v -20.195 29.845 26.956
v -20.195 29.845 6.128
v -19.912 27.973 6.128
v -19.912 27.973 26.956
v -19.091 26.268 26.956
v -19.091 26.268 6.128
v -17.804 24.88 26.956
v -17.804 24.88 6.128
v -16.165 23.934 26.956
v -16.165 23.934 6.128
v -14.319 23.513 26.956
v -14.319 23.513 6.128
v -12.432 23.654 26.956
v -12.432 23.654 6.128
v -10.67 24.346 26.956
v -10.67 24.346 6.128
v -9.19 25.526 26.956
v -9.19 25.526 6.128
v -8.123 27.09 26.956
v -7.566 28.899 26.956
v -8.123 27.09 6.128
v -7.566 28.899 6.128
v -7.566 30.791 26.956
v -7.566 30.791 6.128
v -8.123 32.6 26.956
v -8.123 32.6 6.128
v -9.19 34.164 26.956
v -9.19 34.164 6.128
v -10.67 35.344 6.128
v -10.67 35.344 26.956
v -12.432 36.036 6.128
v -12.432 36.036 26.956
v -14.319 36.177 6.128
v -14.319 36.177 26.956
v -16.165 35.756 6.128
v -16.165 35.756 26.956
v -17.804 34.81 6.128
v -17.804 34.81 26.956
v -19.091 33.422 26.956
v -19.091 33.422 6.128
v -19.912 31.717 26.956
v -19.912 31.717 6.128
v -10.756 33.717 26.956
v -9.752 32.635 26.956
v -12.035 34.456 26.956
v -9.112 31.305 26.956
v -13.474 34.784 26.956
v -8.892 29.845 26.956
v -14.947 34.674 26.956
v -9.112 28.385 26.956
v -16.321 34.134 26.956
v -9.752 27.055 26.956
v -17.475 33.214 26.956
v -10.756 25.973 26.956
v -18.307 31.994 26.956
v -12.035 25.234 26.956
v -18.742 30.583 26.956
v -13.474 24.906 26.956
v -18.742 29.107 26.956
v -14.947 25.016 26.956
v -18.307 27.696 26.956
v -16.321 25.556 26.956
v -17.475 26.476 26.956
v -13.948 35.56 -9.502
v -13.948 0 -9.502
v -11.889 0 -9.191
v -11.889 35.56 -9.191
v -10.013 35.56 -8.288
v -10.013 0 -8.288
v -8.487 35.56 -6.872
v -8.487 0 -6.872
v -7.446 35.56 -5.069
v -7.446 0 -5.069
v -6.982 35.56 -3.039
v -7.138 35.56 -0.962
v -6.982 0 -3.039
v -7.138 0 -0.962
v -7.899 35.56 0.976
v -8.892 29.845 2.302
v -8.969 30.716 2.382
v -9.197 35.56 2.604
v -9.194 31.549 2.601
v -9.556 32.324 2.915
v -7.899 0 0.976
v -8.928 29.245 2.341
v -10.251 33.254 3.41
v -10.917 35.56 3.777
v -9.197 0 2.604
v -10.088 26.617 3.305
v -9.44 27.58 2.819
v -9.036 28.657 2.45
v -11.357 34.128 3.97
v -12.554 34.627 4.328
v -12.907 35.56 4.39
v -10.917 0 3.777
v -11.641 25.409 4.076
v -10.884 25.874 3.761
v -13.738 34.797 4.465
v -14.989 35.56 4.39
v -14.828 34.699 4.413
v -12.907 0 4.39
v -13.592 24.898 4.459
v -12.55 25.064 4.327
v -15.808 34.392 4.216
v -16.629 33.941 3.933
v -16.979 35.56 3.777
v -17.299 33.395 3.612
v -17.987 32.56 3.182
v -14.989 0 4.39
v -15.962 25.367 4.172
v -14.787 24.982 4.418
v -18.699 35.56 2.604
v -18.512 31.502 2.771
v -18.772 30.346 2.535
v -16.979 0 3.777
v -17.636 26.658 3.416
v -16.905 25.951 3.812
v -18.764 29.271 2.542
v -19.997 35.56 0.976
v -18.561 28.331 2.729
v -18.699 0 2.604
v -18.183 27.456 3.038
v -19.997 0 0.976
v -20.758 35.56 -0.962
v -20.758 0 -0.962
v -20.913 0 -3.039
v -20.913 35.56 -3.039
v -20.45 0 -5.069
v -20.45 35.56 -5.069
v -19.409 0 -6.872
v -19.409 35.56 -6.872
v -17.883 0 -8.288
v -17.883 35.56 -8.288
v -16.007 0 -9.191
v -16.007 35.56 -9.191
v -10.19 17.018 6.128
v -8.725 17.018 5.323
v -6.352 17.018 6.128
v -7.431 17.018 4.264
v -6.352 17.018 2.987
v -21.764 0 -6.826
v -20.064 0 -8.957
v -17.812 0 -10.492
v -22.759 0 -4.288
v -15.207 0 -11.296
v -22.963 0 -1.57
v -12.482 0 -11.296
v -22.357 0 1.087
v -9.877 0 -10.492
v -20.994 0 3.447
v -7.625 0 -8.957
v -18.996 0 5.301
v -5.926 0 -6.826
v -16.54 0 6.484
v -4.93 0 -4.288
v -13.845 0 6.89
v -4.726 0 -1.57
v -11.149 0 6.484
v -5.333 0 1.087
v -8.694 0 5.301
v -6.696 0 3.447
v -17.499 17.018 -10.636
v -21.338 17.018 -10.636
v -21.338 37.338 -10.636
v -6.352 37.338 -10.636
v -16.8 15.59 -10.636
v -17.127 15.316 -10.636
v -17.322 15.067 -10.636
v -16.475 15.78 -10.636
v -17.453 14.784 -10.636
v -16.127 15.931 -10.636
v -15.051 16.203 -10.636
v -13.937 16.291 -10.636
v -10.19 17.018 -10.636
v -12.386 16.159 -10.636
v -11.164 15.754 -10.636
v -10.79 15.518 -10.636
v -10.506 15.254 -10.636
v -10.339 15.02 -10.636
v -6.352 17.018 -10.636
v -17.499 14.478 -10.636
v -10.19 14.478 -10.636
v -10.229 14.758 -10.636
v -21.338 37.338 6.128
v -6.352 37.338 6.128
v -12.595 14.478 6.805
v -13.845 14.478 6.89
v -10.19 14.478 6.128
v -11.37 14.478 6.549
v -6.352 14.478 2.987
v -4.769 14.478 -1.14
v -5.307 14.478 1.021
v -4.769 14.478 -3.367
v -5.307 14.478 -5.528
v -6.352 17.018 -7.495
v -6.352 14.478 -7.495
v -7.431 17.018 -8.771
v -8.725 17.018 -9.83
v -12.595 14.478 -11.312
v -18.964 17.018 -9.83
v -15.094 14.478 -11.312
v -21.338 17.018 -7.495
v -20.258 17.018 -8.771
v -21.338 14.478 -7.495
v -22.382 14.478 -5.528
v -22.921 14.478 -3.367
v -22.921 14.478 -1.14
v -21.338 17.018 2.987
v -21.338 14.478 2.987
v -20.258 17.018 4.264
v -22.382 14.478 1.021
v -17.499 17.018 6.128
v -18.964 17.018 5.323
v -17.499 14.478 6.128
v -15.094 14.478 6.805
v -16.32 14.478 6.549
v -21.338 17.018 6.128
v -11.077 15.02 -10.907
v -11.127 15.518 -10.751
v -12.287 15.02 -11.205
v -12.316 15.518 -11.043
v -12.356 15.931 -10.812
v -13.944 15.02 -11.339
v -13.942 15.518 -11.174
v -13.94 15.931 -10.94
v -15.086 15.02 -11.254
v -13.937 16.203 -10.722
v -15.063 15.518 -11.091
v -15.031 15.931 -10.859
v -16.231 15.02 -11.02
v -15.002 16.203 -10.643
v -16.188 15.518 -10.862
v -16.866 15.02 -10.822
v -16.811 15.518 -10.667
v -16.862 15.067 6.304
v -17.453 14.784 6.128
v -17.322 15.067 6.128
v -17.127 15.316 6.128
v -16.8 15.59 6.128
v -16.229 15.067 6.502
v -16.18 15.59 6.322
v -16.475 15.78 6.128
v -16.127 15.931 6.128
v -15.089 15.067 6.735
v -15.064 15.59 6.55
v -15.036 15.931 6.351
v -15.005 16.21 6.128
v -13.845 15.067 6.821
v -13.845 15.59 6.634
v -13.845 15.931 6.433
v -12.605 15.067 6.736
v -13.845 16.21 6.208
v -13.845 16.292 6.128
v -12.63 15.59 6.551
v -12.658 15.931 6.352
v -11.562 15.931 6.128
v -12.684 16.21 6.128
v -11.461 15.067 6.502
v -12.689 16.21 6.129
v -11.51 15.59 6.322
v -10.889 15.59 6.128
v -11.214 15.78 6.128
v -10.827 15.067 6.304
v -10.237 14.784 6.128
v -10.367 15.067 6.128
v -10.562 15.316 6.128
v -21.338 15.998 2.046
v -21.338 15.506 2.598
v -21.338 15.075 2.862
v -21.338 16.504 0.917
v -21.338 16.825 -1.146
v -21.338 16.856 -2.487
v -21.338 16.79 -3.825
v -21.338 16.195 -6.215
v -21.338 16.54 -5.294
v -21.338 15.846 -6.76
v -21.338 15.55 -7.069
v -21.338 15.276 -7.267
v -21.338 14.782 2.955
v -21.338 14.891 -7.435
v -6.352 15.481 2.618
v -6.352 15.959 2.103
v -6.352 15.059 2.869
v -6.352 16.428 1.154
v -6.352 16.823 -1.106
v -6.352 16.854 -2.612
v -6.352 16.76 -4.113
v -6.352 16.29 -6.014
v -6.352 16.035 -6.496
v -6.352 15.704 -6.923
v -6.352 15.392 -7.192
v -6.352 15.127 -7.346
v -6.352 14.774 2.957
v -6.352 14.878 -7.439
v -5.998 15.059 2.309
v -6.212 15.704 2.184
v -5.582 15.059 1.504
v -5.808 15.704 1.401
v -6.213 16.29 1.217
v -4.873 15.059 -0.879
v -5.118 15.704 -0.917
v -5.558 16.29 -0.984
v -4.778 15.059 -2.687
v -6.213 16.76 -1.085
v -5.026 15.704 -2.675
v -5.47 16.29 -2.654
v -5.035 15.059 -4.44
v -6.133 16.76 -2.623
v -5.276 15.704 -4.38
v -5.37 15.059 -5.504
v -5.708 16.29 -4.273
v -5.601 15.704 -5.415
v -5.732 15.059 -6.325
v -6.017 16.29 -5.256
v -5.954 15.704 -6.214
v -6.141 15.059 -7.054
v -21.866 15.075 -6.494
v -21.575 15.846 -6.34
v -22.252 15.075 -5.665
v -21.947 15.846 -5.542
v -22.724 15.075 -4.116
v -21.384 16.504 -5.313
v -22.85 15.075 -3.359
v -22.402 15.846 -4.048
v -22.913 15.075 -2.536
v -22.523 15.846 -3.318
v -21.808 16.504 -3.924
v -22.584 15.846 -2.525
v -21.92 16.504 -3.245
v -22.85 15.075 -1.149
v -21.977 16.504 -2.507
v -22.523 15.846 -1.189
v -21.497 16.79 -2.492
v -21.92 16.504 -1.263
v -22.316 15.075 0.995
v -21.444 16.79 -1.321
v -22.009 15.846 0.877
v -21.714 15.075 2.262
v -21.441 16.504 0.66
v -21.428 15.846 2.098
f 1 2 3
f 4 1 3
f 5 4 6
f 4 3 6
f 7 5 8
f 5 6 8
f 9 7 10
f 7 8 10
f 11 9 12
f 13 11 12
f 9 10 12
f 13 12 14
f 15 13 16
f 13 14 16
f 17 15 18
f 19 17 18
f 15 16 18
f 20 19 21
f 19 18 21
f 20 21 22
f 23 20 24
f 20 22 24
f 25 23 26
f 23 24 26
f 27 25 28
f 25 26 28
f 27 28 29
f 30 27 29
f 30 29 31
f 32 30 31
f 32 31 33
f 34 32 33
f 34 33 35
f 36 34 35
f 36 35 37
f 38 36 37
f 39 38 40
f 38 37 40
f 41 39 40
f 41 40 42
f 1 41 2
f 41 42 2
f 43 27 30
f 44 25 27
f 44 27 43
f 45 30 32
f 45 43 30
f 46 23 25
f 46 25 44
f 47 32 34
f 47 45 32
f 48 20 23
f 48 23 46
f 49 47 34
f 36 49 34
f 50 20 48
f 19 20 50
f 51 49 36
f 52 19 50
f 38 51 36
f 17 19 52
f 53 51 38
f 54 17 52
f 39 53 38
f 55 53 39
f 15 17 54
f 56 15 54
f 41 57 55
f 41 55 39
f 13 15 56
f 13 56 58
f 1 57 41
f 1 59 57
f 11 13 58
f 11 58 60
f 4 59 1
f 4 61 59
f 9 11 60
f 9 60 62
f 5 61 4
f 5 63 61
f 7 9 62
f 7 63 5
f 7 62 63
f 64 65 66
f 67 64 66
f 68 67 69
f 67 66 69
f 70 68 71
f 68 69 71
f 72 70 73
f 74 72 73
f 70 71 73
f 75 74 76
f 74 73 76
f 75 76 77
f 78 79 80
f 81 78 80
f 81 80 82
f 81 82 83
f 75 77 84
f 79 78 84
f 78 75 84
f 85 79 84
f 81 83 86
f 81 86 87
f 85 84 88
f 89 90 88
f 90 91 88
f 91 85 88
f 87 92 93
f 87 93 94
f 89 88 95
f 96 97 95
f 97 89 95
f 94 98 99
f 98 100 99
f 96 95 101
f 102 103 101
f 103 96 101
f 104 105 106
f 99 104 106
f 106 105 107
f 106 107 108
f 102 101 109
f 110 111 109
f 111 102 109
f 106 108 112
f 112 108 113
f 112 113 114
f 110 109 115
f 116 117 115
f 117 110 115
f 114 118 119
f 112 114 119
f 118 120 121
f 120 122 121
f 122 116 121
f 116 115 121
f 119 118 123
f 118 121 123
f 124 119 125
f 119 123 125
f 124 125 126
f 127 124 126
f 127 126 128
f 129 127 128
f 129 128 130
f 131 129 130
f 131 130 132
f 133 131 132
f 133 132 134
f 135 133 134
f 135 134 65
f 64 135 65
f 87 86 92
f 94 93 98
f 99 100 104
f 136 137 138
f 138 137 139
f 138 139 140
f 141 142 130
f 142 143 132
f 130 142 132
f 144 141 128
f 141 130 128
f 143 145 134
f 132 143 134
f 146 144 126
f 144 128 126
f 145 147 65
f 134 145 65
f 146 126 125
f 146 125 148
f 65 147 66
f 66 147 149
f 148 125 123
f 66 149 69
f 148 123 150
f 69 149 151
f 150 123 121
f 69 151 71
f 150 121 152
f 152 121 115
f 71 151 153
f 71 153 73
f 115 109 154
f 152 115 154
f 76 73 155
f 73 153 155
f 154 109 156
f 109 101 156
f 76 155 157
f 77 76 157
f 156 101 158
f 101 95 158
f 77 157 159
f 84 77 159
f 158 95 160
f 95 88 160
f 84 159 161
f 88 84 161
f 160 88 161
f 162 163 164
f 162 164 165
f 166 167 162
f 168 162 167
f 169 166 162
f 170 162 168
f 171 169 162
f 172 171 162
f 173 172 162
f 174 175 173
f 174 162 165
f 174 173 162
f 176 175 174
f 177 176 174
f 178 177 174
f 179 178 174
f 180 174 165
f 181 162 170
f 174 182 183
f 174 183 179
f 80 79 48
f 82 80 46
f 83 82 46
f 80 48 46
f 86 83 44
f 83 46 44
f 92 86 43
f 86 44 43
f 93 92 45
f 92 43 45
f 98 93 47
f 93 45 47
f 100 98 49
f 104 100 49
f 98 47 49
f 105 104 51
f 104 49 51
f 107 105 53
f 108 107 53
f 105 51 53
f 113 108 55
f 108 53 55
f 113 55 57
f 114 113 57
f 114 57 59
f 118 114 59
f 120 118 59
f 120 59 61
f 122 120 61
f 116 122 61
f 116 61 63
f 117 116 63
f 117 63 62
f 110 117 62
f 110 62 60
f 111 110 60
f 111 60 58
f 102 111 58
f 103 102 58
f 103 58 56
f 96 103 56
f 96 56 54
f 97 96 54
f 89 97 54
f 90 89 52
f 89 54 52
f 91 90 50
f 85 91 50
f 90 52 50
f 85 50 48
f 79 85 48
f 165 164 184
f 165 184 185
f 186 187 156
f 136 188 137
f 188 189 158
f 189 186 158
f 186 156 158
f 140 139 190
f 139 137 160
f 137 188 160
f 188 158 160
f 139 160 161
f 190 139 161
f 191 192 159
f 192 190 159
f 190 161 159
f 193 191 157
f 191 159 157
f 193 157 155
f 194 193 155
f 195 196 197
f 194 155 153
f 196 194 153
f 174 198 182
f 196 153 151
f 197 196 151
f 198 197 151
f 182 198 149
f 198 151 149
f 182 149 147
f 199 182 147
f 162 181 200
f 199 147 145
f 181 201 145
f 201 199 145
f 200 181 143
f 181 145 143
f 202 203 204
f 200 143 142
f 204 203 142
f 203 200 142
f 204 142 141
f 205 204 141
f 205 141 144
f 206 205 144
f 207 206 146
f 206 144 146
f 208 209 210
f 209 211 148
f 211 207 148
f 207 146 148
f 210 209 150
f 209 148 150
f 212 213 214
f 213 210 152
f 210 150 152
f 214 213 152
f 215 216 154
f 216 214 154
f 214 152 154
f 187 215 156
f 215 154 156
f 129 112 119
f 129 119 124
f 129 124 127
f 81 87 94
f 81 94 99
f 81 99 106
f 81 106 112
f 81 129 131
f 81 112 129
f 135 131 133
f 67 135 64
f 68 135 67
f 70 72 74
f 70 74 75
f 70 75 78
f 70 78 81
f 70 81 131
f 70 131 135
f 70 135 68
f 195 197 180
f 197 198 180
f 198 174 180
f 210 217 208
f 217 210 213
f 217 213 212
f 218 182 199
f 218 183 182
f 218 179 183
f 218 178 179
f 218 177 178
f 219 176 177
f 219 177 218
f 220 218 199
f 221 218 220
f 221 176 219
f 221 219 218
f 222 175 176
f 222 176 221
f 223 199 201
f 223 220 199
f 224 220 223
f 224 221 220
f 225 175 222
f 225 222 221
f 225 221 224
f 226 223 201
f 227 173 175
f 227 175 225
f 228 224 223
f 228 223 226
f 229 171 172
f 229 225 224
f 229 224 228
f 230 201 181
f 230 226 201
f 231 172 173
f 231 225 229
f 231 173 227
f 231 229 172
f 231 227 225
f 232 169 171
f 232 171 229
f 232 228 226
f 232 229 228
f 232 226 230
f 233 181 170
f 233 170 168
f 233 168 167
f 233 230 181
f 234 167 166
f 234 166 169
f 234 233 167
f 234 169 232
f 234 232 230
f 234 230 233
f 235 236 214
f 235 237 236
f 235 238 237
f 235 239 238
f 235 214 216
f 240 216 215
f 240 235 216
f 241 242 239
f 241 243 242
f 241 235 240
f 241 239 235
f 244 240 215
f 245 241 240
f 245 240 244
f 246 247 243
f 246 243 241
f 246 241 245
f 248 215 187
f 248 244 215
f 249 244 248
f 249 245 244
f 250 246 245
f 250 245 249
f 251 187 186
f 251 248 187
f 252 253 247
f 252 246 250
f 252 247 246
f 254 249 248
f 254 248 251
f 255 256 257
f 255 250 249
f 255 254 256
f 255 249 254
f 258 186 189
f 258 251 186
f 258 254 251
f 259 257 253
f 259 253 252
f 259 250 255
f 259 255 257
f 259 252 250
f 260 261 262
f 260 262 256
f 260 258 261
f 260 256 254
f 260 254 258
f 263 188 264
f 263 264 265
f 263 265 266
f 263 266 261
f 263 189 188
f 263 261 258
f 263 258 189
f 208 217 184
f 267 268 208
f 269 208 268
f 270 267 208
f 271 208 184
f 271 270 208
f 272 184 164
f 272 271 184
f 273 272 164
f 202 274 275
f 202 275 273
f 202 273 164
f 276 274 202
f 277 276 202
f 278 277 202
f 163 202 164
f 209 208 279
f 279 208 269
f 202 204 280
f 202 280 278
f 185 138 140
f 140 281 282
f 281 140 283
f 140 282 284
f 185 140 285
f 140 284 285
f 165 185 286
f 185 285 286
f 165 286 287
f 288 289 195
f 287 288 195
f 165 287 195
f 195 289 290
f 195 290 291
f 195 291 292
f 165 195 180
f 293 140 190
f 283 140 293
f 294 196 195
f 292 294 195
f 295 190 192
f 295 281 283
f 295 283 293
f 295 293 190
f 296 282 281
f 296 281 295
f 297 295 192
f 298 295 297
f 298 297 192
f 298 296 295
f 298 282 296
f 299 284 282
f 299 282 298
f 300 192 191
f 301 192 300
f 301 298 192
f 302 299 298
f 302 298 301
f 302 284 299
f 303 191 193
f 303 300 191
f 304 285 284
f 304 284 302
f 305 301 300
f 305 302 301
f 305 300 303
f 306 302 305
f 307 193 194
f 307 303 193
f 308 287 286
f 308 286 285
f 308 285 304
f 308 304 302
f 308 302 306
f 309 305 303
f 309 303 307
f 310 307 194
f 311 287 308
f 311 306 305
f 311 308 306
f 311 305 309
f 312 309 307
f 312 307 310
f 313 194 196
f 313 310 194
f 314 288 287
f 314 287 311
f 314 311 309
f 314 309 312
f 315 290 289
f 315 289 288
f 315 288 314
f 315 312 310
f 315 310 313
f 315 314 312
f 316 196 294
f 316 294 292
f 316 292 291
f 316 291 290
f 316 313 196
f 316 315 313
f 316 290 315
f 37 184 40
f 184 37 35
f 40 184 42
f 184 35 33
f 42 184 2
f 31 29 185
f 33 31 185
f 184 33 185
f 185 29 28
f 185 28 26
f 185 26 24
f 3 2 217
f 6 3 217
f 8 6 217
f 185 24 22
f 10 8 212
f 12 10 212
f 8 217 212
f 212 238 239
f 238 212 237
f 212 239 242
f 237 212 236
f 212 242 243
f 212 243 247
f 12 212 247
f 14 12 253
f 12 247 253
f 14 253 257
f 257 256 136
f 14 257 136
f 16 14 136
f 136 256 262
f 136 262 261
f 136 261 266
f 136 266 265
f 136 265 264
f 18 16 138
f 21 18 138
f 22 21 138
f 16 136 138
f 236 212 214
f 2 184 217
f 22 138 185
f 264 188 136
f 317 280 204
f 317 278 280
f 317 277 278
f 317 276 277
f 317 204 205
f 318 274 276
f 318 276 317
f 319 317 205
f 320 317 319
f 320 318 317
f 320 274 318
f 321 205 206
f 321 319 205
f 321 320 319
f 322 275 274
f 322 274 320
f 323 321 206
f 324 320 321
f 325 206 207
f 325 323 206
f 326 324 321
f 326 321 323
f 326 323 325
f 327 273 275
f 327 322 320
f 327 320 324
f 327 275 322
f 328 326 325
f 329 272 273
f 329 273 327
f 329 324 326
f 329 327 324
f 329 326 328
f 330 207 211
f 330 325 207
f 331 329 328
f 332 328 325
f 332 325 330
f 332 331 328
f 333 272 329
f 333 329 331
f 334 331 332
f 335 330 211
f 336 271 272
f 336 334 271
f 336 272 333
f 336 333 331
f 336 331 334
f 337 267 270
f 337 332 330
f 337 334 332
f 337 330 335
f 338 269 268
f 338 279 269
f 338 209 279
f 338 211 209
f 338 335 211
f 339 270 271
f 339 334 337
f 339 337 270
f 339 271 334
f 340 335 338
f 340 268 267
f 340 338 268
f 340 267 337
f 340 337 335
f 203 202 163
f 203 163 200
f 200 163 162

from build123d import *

# Parameters (mm, degrees)
SKETCH1_R           = 9.144
BOSS_EXTRUDE1_DEPTH = 17.018
SKETCH2_W           = 14.986
SKETCH2_H           = 16.764
BOSS_EXTRUDE2_DEPTH = 20.32
SKETCH3_R           = 6.35
BOSS_EXTRUDE3_DEPTH = 20.828
SKETCH5_R           = 4.953
CUT_EXTRUDE1_DEPTH  = 25.4
SKETCH6_R           = 6.985
CUT_EXTRUDE2_DEPTH  = 35.56
FILLET3_R           = 2.54


with BuildPart() as part:
    # Sketch1 → Boss-Extrude1 (new body)
    with BuildSketch(Plane(origin=(0, 0, 0), x_dir=(1, 0, 0), z_dir=(0, 1, 0))):
        with Locations(Location((-13.844609685, 2.253750912, 0), (0, 0, 270))):
            Circle(SKETCH1_R)
    extrude(amount=BOSS_EXTRUDE1_DEPTH)

    # Sketch2 → Boss-Extrude2 (add)
    with BuildSketch(Plane(origin=(0, 17.018, 0), x_dir=(1, 0, 0), z_dir=(0, 1, 0))):
        with Locations((-13.844609685, 2.253750912)):
            Rectangle(SKETCH2_W, SKETCH2_H)
    extrude(amount=BOSS_EXTRUDE2_DEPTH)

    # Sketch3 → Boss-Extrude3 (add)
    with BuildSketch(Plane.XY.offset(6.128249088)):
        with Locations(Location((-13.844609685, 29.845, 0), (0, 0, 180))):
            Circle(SKETCH3_R)
    extrude(amount=BOSS_EXTRUDE3_DEPTH)

    # Sketch5 → Cut-Extrude1 (cut)
    with BuildSketch(Plane.XY.offset(26.956249088)):
        with Locations((-13.844609685, 29.845)):
            Circle(SKETCH5_R)
    extrude(amount=-CUT_EXTRUDE1_DEPTH, mode=Mode.SUBTRACT)

    # Sketch6 → Cut-Extrude2 (cut)
    with BuildSketch(Plane.XZ):
        with Locations(Location((-13.947920493, -2.516662253, 0), (0, 0, 270))):
            Circle(SKETCH6_R)
    extrude(amount=-CUT_EXTRUDE2_DEPTH, mode=Mode.SUBTRACT)

    # Fillet3
    # the kernel refuses this fillet: 2.54 mm, written as the material it takes off along each edge
    with BuildSketch(Plane(origin=(-13.844609685, 17.018, -2.253750912), x_dir=(-0.2627084277127984, 0, -0.9648752675909303), z_dir=(0.9648752675909303, 0, -0.2627084277127984))) as fillet3_piece_1_section:
        with BuildLine():
            CenterArc((9.144 - FILLET3_R, -FILLET3_R), FILLET3_R, 0, 90)
            Line((9.144 - FILLET3_R, 0), (9.144, 0))
            Line((9.144, 0), (9.144, -FILLET3_R))
        make_face()
    fillet3_piece_1 = revolve(axis=Axis((-13.844609685, 17.018, -2.253750912), (0, 1, 0)), revolution_arc=149.538336895, mode=Mode.PRIVATE)
    fillet3_piece_1 = split(fillet3_piece_1, bisect_by=Plane(origin=(-16.671949394, 16.123690595, -10.635750912), z_dir=(0, 0, -1)), keep=Keep.TOP, mode=Mode.PRIVATE)
    add(fillet3_piece_1, mode=Mode.SUBTRACT)
    with BuildSketch(Plane(origin=(-13.844609685, 17.018, -2.253750912), x_dir=(-0.2627084277127984, 0, -0.9648752675909303), z_dir=(0.9648752675909303, 0, -0.2627084277127984))) as fillet3_piece_2_section:
        with BuildLine():
            CenterArc((9.144 - FILLET3_R, -FILLET3_R), FILLET3_R, 0, 90)
            Line((9.144 - FILLET3_R, 0), (9.144, 0))
            Line((9.144, 0), (9.144, -FILLET3_R))
        make_face()
    fillet3_piece_2 = revolve(axis=Axis((-13.844609685, 17.018, -2.253750912), (0, 1, 0)), revolution_arc=149.538336895, mode=Mode.PRIVATE)
    fillet3_piece_2 = split(fillet3_piece_2, bisect_by=Plane(origin=(-16.671949372, 16.123690833, 6.128249088), z_dir=(0, 0, 1)), keep=Keep.TOP, mode=Mode.PRIVATE)
    add(fillet3_piece_2, mode=Mode.SUBTRACT)
    with BuildSketch(Plane(origin=(-13.844609685, 17.018, -2.253750912), x_dir=(-0.2627084277127984, 0, -0.9648752675909303), z_dir=(0.9648752675909303, 0, -0.2627084277127984))) as fillet3_piece_3_section:
        with BuildLine():
            CenterArc((9.144 - FILLET3_R, -FILLET3_R), FILLET3_R, 0, 90)
            Line((9.144 - FILLET3_R, 0), (9.144, 0))
            Line((9.144, 0), (9.144, -FILLET3_R))
        make_face()
    fillet3_piece_3 = revolve(axis=Axis((-13.844609685, 17.018, -2.253750912), (0, 1, 0)), revolution_arc=149.538336895, mode=Mode.PRIVATE)
    fillet3_piece_3 = split(fillet3_piece_3, bisect_by=Plane(origin=(-21.337609685, 16.368354177, -2.253748905), z_dir=(-1, 0, 0)), keep=Keep.TOP, mode=Mode.PRIVATE)
    add(fillet3_piece_3, mode=Mode.SUBTRACT)
    with BuildSketch(Plane(origin=(-13.844609685, 17.018, -2.253750912), x_dir=(-0.8937341447307489, 0, 0.4485970112945439), z_dir=(-0.4485970112945439, 0, -0.8937341447307489))) as fillet3_piece_4_section:
        with BuildLine():
            CenterArc((9.144 - FILLET3_R, -FILLET3_R), FILLET3_R, 0, 90)
            Line((9.144 - FILLET3_R, 0), (9.144, 0))
            Line((9.144, 0), (9.144, -FILLET3_R))
        make_face()
    fillet3_piece_4 = revolve(axis=Axis((-13.844609685, 17.018, -2.253750912), (0, 1, 0)), revolution_arc=63.346294775, mode=Mode.PRIVATE)
    fillet3_piece_4 = split(fillet3_piece_4, bisect_by=Plane(origin=(-21.337609685, 16.206370087, 2.181832168), z_dir=(-1, 0, 0)), keep=Keep.TOP, mode=Mode.PRIVATE)
    add(fillet3_piece_4, mode=Mode.SUBTRACT)
    with BuildSketch(Plane(origin=(-13.844609685, 17.018, -2.253750912), x_dir=(-0.8937341447307489, 0, 0.4485970112945439), z_dir=(-0.4485970112945439, 0, -0.8937341447307489))) as fillet3_piece_5_section:
        with BuildLine():
            CenterArc((9.144 - FILLET3_R, -FILLET3_R), FILLET3_R, 0, 90)
            Line((9.144 - FILLET3_R, 0), (9.144, 0))
            Line((9.144, 0), (9.144, -FILLET3_R))
        make_face()
    fillet3_piece_5 = revolve(axis=Axis((-13.844609685, 17.018, -2.253750912), (0, 1, 0)), revolution_arc=63.346294775, mode=Mode.PRIVATE)
    fillet3_piece_5 = split(fillet3_piece_5, bisect_by=Plane(origin=(-15.321370262, 16.241743505, 6.128249088), z_dir=(0, 0, 1)), keep=Keep.TOP, mode=Mode.PRIVATE)
    add(fillet3_piece_5, mode=Mode.SUBTRACT)
    with BuildSketch(Plane(origin=(-13.844609685, 17.018, -2.253750912), x_dir=(0.8937598579171911, 0, -0.4485457795764468), z_dir=(0.4485457795764468, 0, 0.8937598579171911))) as fillet3_piece_6_section:
        with BuildLine():
            CenterArc((9.144 - FILLET3_R, -FILLET3_R), FILLET3_R, 0, 90)
            Line((9.144 - FILLET3_R, 0), (9.144, 0))
            Line((9.144, 0), (9.144, -FILLET3_R))
        make_face()
    fillet3_piece_6 = revolve(axis=Axis((-13.844609685, 17.018, -2.253750912), (0, 1, 0)), revolution_arc=126.699158212, mode=Mode.PRIVATE)
    fillet3_piece_6 = split(fillet3_piece_6, bisect_by=Plane(origin=(-6.351609685, 16.206428058, -6.689039599), z_dir=(1, 0, 0)), keep=Keep.TOP, mode=Mode.PRIVATE)
    add(fillet3_piece_6, mode=Mode.SUBTRACT)
    with BuildSketch(Plane(origin=(-13.844609685, 17.018, -2.253750912), x_dir=(0.8937598579171911, 0, -0.4485457795764468), z_dir=(0.4485457795764468, 0, 0.8937598579171911))) as fillet3_piece_7_section:
        with BuildLine():
            CenterArc((9.144 - FILLET3_R, -FILLET3_R), FILLET3_R, 0, 90)
            Line((9.144 - FILLET3_R, 0), (9.144, 0))
            Line((9.144, 0), (9.144, -FILLET3_R))
        make_face()
    fillet3_piece_7 = revolve(axis=Axis((-13.844609685, 17.018, -2.253750912), (0, 1, 0)), revolution_arc=126.699158212, mode=Mode.PRIVATE)
    fillet3_piece_7 = split(fillet3_piece_7, bisect_by=Plane(origin=(-21.337609685, 16.206428241, -6.68903958), z_dir=(-1, 0, 0)), keep=Keep.TOP, mode=Mode.PRIVATE)
    add(fillet3_piece_7, mode=Mode.SUBTRACT)
    with BuildSketch(Plane(origin=(-13.844609685, 17.018, -2.253750912), x_dir=(0.8937598579171911, 0, -0.4485457795764468), z_dir=(0.4485457795764468, 0, 0.8937598579171911))) as fillet3_piece_8_section:
        with BuildLine():
            CenterArc((9.144 - FILLET3_R, -FILLET3_R), FILLET3_R, 0, 90)
            Line((9.144 - FILLET3_R, 0), (9.144, 0))
            Line((9.144, 0), (9.144, -FILLET3_R))
        make_face()
    fillet3_piece_8 = revolve(axis=Axis((-13.844609685, 17.018, -2.253750912), (0, 1, 0)), revolution_arc=126.699158212, mode=Mode.PRIVATE)
    fillet3_piece_8 = split(fillet3_piece_8, bisect_by=Plane(origin=(-13.844610271, 16.241742489, -10.635750912), z_dir=(0, 0, -1)), keep=Keep.TOP, mode=Mode.PRIVATE)
    add(fillet3_piece_8, mode=Mode.SUBTRACT)
    with BuildSketch(Plane(origin=(-13.844609685, 17.018, -2.253750912), x_dir=(0.26270842771276587, 0, 0.9648752675909392), z_dir=(-0.9648752675909392, 0, 0.26270842771276587))) as fillet3_piece_9_section:
        with BuildLine():
            CenterArc((9.144 - FILLET3_R, -FILLET3_R), FILLET3_R, 0, 90)
            Line((9.144 - FILLET3_R, 0), (9.144, 0))
            Line((9.144, 0), (9.144, -FILLET3_R))
        make_face()
    fillet3_piece_9 = revolve(axis=Axis((-13.844609685, 17.018, -2.253750912), (0, 1, 0)), revolution_arc=149.538336895, mode=Mode.PRIVATE)
    fillet3_piece_9 = split(fillet3_piece_9, bisect_by=Plane(origin=(-11.017269976, 16.123690595, 6.128249088), z_dir=(0, 0, 1)), keep=Keep.TOP, mode=Mode.PRIVATE)
    add(fillet3_piece_9, mode=Mode.SUBTRACT)
    with BuildSketch(Plane(origin=(-13.844609685, 17.018, -2.253750912), x_dir=(0.26270842771276587, 0, 0.9648752675909392), z_dir=(-0.9648752675909392, 0, 0.26270842771276587))) as fillet3_piece_10_section:
        with BuildLine():
            CenterArc((9.144 - FILLET3_R, -FILLET3_R), FILLET3_R, 0, 90)
            Line((9.144 - FILLET3_R, 0), (9.144, 0))
            Line((9.144, 0), (9.144, -FILLET3_R))
        make_face()
    fillet3_piece_10 = revolve(axis=Axis((-13.844609685, 17.018, -2.253750912), (0, 1, 0)), revolution_arc=149.538336895, mode=Mode.PRIVATE)
    fillet3_piece_10 = split(fillet3_piece_10, bisect_by=Plane(origin=(-11.017269998, 16.123690833, -10.635750912), z_dir=(0, 0, -1)), keep=Keep.TOP, mode=Mode.PRIVATE)
    add(fillet3_piece_10, mode=Mode.SUBTRACT)
    with BuildSketch(Plane(origin=(-13.844609685, 17.018, -2.253750912), x_dir=(0.26270842771276587, 0, 0.9648752675909392), z_dir=(-0.9648752675909392, 0, 0.26270842771276587))) as fillet3_piece_11_section:
        with BuildLine():
            CenterArc((9.144 - FILLET3_R, -FILLET3_R), FILLET3_R, 0, 90)
            Line((9.144 - FILLET3_R, 0), (9.144, 0))
            Line((9.144, 0), (9.144, -FILLET3_R))
        make_face()
    fillet3_piece_11 = revolve(axis=Axis((-13.844609685, 17.018, -2.253750912), (0, 1, 0)), revolution_arc=149.538336895, mode=Mode.PRIVATE)
    fillet3_piece_11 = split(fillet3_piece_11, bisect_by=Plane(origin=(-6.351609685, 16.368354177, -2.253752919), z_dir=(1, 0, 0)), keep=Keep.TOP, mode=Mode.PRIVATE)
    add(fillet3_piece_11, mode=Mode.SUBTRACT)
    with BuildSketch(Plane(origin=(-13.844609685, 17.018, -2.253750912), x_dir=(0, 0, 1), z_dir=(-1, 0, 0))) as fillet3_piece_12_section:
        with BuildLine():
            CenterArc((9.144 - FILLET3_R, -FILLET3_R), FILLET3_R, 0, 90)
            Line((9.144 - FILLET3_R, 0), (9.144, 0))
            Line((9.144, 0), (9.144, -FILLET3_R))
        make_face()
    fillet3_piece_12 = revolve(axis=Axis((-13.844609685, 17.018, -2.253750912), (0, 1, 0)), revolution_arc=63.346294775, mode=Mode.PRIVATE)
    fillet3_piece_12 = split(fillet3_piece_12, bisect_by=Plane(origin=(-12.367849263, 16.241743644, 6.128249088), z_dir=(0, 0, 1)), keep=Keep.TOP, mode=Mode.PRIVATE)
    add(fillet3_piece_12, mode=Mode.SUBTRACT)
    with BuildSketch(Plane(origin=(-13.844609685, 17.018, -2.253750912), x_dir=(0, 0, 1), z_dir=(-1, 0, 0))) as fillet3_piece_13_section:
        with BuildLine():
            CenterArc((9.144 - FILLET3_R, -FILLET3_R), FILLET3_R, 0, 90)
            Line((9.144 - FILLET3_R, 0), (9.144, 0))
            Line((9.144, 0), (9.144, -FILLET3_R))
        make_face()
    fillet3_piece_13 = revolve(axis=Axis((-13.844609685, 17.018, -2.253750912), (0, 1, 0)), revolution_arc=63.346294775, mode=Mode.PRIVATE)
    fillet3_piece_13 = split(fillet3_piece_13, bisect_by=Plane(origin=(-6.351609685, 16.20637027, 2.181832149), z_dir=(1, 0, 0)), keep=Keep.TOP, mode=Mode.PRIVATE)
    add(fillet3_piece_13, mode=Mode.SUBTRACT)


solid = part.part
